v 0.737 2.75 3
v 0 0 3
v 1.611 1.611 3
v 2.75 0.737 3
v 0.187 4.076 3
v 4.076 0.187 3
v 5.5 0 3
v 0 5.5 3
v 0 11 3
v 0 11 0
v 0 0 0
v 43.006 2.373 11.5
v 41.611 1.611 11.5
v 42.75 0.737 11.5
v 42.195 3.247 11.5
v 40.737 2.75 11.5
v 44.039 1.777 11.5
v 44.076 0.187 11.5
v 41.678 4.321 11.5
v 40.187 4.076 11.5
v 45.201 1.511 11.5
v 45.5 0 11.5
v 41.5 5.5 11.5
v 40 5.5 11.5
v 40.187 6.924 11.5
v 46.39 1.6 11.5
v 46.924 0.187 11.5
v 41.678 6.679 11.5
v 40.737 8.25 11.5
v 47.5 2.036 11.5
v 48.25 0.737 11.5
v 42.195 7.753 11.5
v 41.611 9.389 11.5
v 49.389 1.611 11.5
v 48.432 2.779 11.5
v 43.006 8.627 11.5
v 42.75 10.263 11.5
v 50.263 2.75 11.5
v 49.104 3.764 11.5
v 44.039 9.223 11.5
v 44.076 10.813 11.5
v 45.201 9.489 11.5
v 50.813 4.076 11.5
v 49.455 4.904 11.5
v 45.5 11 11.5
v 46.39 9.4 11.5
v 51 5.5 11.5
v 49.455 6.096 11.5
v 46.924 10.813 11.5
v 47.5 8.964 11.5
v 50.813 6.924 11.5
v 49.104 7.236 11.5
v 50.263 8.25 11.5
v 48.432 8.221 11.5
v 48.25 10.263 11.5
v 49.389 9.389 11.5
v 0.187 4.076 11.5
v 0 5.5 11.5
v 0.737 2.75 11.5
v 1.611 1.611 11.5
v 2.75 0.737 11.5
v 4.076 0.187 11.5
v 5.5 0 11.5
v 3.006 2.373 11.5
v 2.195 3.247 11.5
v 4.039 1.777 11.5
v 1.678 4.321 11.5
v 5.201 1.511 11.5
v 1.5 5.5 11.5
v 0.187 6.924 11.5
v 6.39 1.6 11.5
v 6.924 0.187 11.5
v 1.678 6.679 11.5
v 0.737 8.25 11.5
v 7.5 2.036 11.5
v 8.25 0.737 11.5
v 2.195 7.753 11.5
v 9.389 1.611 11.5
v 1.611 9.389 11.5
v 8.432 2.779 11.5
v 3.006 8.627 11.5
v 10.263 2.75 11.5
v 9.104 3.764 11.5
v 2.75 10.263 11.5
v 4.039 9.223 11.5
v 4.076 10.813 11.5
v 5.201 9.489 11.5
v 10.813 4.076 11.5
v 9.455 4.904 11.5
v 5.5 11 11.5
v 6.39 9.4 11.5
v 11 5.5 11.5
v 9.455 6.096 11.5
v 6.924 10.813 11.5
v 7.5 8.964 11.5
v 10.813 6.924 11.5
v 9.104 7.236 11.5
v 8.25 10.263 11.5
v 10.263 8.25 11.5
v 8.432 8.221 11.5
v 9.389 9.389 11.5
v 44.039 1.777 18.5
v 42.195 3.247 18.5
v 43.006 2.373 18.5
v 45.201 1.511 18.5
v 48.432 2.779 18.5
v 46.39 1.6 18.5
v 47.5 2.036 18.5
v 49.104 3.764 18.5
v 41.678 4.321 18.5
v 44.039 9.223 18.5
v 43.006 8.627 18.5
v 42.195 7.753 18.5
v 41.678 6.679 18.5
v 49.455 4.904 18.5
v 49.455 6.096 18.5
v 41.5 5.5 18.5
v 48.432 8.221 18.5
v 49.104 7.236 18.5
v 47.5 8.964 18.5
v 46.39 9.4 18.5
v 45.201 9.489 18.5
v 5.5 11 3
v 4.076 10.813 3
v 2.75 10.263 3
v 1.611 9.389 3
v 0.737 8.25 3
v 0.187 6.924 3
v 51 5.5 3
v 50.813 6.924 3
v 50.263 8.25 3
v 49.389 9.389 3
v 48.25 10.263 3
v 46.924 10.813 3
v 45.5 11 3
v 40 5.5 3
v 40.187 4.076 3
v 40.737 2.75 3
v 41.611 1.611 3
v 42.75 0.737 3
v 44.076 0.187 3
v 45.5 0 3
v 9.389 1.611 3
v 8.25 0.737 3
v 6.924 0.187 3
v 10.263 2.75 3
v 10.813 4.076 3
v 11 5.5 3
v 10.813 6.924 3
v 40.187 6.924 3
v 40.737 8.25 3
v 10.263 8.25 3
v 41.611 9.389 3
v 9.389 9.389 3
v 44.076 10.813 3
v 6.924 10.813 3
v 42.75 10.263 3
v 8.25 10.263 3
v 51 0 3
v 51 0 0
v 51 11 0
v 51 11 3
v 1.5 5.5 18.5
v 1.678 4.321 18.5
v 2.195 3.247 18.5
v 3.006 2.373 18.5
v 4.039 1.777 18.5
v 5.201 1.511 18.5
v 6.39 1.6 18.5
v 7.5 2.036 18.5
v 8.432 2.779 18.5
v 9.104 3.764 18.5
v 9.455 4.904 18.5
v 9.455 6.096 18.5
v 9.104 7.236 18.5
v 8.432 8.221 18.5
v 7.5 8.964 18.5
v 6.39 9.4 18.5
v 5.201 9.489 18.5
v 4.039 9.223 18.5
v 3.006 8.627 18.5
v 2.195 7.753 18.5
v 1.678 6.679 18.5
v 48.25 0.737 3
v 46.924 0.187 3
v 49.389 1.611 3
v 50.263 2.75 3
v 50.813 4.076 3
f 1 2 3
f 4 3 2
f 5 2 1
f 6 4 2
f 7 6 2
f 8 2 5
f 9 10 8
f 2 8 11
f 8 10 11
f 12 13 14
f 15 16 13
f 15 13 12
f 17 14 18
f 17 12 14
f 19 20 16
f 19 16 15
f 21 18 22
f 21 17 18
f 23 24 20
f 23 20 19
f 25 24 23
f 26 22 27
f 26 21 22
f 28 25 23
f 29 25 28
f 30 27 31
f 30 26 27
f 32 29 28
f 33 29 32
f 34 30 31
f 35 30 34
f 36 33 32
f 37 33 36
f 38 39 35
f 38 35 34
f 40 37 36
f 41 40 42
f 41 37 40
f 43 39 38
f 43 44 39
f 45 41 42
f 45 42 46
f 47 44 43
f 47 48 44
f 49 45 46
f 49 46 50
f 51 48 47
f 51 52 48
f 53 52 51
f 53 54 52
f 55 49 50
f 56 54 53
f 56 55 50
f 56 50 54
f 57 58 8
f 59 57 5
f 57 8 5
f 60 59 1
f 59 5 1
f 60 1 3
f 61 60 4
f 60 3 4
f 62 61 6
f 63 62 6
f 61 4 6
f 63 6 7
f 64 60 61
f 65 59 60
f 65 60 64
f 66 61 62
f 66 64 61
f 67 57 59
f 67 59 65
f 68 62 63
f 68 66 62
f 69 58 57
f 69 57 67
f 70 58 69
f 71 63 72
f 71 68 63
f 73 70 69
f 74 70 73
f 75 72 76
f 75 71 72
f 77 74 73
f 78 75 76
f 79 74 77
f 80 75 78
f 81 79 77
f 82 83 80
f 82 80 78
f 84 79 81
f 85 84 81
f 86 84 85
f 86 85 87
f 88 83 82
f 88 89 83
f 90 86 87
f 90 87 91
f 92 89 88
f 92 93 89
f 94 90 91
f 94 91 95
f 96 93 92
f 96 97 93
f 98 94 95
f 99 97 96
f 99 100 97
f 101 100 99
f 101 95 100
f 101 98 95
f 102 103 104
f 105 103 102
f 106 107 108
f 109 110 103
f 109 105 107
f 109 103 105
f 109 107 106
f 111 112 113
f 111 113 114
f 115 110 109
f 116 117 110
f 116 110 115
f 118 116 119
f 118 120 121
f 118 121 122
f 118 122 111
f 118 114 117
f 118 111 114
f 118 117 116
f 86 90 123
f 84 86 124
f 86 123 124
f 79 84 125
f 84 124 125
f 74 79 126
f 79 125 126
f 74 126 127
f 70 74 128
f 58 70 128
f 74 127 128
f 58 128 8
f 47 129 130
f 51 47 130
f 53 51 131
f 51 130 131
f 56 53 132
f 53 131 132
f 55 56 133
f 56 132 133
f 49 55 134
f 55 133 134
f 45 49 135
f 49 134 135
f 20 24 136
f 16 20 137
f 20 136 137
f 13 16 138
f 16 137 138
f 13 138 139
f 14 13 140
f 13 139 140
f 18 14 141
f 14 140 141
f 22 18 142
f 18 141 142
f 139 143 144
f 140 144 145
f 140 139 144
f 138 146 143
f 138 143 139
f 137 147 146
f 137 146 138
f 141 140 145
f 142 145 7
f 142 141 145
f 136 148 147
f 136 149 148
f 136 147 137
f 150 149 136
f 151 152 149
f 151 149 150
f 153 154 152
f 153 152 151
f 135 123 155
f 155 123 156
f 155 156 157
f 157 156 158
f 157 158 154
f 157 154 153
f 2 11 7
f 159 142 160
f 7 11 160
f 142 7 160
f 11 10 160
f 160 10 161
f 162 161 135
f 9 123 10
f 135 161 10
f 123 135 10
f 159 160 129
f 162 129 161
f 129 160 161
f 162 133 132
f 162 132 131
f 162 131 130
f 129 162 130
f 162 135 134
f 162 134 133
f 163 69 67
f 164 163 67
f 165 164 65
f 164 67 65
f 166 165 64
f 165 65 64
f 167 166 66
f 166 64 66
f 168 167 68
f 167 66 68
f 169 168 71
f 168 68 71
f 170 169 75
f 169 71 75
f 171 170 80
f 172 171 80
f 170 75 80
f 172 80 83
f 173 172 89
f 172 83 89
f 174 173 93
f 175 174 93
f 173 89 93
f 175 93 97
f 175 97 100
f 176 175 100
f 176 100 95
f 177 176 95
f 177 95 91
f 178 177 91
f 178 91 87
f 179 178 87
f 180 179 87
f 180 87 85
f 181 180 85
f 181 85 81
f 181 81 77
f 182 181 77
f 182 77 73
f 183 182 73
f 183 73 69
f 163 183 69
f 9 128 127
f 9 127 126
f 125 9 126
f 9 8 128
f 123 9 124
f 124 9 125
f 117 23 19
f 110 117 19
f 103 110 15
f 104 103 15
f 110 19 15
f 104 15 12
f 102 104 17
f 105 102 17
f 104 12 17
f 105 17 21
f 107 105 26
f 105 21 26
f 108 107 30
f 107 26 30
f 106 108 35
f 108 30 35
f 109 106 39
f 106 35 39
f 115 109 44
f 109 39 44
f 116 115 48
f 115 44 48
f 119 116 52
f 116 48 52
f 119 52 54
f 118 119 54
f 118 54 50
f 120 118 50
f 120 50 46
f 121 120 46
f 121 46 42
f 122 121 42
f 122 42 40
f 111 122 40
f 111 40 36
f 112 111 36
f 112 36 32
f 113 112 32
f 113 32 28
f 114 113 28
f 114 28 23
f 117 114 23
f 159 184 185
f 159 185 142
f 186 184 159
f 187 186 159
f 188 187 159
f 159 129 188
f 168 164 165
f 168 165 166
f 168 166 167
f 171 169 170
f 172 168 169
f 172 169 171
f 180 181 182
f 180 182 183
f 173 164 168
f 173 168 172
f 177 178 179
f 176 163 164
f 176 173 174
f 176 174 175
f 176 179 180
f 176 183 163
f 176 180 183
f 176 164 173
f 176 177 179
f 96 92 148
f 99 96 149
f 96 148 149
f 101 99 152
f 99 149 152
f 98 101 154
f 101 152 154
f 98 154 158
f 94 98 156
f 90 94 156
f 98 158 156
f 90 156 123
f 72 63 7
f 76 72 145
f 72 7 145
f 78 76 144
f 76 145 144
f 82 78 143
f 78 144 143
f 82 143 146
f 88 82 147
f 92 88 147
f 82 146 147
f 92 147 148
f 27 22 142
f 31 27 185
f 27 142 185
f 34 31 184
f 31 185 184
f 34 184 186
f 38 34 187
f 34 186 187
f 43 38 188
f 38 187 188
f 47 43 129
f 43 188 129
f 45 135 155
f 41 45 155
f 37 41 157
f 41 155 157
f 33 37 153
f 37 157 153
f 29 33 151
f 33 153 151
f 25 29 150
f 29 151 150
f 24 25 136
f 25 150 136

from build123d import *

# Parameters (mm, degrees)
F1_DEPTH = 3
F2_DEPTH = 11.5
F3_DEPTH = 18.5


with BuildPart() as f1:
    # F0 (on Top) → F1 (new body)
    with BuildSketch(Plane.XY):
        with BuildLine():
            Line((0, 5.5), (0, 0))
            Line((0, 0), (5.5, 0))
            ThreePointArc((5.5, 0), (1.6109127035, 1.6109127035), (0, 5.5))
        make_face()
        with BuildLine():
            ThreePointArc((11, 5.5), (9.3890872965, 1.6109127035), (5.5, 0))
            Line((5.5, 0), (45.5, 0))
            ThreePointArc((45.5, 0), (41.6109127035, 1.6109127035), (40, 5.5))
            Line((40, 5.5), (11, 5.5))
        make_face()
        with BuildLine():
            ThreePointArc((0, 5.5), (1.6109127035, 1.6109127035), (5.5, 0))
            ThreePointArc((5.5, 0), (9.3890872965, 1.6109127035), (11, 5.5))
            Line((11, 5.5), (9.5, 5.5))
            ThreePointArc((9.5, 5.5), (5.5, 1.5), (1.5, 5.5))
            Line((1.5, 5.5), (0, 5.5))
        make_face()
        with BuildLine():
            ThreePointArc((5.5, 11), (1.6109127035, 9.3890872965), (0, 5.5))
            Line((0, 5.5), (1.5, 5.5))
            ThreePointArc((1.5, 5.5), (5.5, 9.5), (9.5, 5.5))
            Line((9.5, 5.5), (11, 5.5))
            ThreePointArc((11, 5.5), (9.3890872965, 9.3890872965), (5.5, 11))
        make_face()
        with BuildLine():
            Line((0, 11), (0, 5.5))
            ThreePointArc((0, 5.5), (1.6109127035, 9.3890872965), (5.5, 11))
            Line((5.5, 11), (0, 11))
        make_face()
        with BuildLine():
            ThreePointArc((51, 5.5), (49.3890872965, 1.6109127035), (45.5, 0))
            Line((45.5, 0), (51, 0))
            Line((51, 0), (51, 5.5))
        make_face()
        with BuildLine():
            ThreePointArc((40, 5.5), (41.6109127035, 1.6109127035), (45.5, 0))
            ThreePointArc((45.5, 0), (49.3890872965, 1.6109127035), (51, 5.5))
            Line((51, 5.5), (49.5, 5.5))
            ThreePointArc((49.5, 5.5), (45.5, 1.5), (41.5, 5.5))
            Line((41.5, 5.5), (40, 5.5))
        make_face()
        with BuildLine():
            ThreePointArc((5.5, 11), (9.3890872965, 9.3890872965), (11, 5.5))
            Line((11, 5.5), (40, 5.5))
            ThreePointArc((40, 5.5), (41.6109127035, 9.3890872965), (45.5, 11))
            Line((45.5, 11), (5.5, 11))
        make_face()
        with BuildLine():
            ThreePointArc((45.5, 11), (41.6109127035, 9.3890872965), (40, 5.5))
            Line((40, 5.5), (41.5, 5.5))
            ThreePointArc((41.5, 5.5), (45.5, 9.5), (49.5, 5.5))
            Line((49.5, 5.5), (51, 5.5))
            ThreePointArc((51, 5.5), (49.3890872965, 9.3890872965), (45.5, 11))
        make_face()
        with BuildLine():
            ThreePointArc((45.5, 11), (49.3890872965, 9.3890872965), (51, 5.5))
            Line((51, 5.5), (51, 11))
            Line((51, 11), (45.5, 11))
        make_face()
    extrude(amount=F1_DEPTH)

    # F0 (on Top) → F2 (join)
    with BuildSketch(Plane.XY):
        with BuildLine():
            ThreePointArc((0, 5.5), (1.6109127035, 1.6109127035), (5.5, 0))
            ThreePointArc((5.5, 0), (9.3890872965, 1.6109127035), (11, 5.5))
            Line((11, 5.5), (9.5, 5.5))
            ThreePointArc((9.5, 5.5), (5.5, 1.5), (1.5, 5.5))
            Line((1.5, 5.5), (0, 5.5))
        make_face()
        with BuildLine():
            ThreePointArc((5.5, 11), (1.6109127035, 9.3890872965), (0, 5.5))
            Line((0, 5.5), (1.5, 5.5))
            ThreePointArc((1.5, 5.5), (5.5, 9.5), (9.5, 5.5))
            Line((9.5, 5.5), (11, 5.5))
            ThreePointArc((11, 5.5), (9.3890872965, 9.3890872965), (5.5, 11))
        make_face()
        with BuildLine():
            ThreePointArc((45.5, 11), (41.6109127035, 9.3890872965), (40, 5.5))
            Line((40, 5.5), (41.5, 5.5))
            ThreePointArc((41.5, 5.5), (45.5, 9.5), (49.5, 5.5))
            Line((49.5, 5.5), (51, 5.5))
            ThreePointArc((51, 5.5), (49.3890872965, 9.3890872965), (45.5, 11))
        make_face()
        with BuildLine():
            ThreePointArc((40, 5.5), (41.6109127035, 1.6109127035), (45.5, 0))
            ThreePointArc((45.5, 0), (49.3890872965, 1.6109127035), (51, 5.5))
            Line((51, 5.5), (49.5, 5.5))
            ThreePointArc((49.5, 5.5), (45.5, 1.5), (41.5, 5.5))
            Line((41.5, 5.5), (40, 5.5))
        make_face()
    extrude(amount=F2_DEPTH)

    # F0 (on Top) → F3 (join)
    with BuildSketch(Plane.XY):
        with BuildLine():
            ThreePointArc((49.5, 5.5), (45.5, 9.5), (41.5, 5.5))
            Line((41.5, 5.5), (49.5, 5.5))
        make_face()
        with BuildLine():
            Line((49.5, 5.5), (41.5, 5.5))
            ThreePointArc((41.5, 5.5), (45.5, 1.5), (49.5, 5.5))
        make_face()
        with BuildLine():
            ThreePointArc((9.5, 5.5), (5.5, 9.5), (1.5, 5.5))
            Line((1.5, 5.5), (9.5, 5.5))
        make_face()
        with BuildLine():
            Line((9.5, 5.5), (1.5, 5.5))
            ThreePointArc((1.5, 5.5), (5.5, 1.5), (9.5, 5.5))
        make_face()
    extrude(amount=F3_DEPTH)


solid = f1.part
